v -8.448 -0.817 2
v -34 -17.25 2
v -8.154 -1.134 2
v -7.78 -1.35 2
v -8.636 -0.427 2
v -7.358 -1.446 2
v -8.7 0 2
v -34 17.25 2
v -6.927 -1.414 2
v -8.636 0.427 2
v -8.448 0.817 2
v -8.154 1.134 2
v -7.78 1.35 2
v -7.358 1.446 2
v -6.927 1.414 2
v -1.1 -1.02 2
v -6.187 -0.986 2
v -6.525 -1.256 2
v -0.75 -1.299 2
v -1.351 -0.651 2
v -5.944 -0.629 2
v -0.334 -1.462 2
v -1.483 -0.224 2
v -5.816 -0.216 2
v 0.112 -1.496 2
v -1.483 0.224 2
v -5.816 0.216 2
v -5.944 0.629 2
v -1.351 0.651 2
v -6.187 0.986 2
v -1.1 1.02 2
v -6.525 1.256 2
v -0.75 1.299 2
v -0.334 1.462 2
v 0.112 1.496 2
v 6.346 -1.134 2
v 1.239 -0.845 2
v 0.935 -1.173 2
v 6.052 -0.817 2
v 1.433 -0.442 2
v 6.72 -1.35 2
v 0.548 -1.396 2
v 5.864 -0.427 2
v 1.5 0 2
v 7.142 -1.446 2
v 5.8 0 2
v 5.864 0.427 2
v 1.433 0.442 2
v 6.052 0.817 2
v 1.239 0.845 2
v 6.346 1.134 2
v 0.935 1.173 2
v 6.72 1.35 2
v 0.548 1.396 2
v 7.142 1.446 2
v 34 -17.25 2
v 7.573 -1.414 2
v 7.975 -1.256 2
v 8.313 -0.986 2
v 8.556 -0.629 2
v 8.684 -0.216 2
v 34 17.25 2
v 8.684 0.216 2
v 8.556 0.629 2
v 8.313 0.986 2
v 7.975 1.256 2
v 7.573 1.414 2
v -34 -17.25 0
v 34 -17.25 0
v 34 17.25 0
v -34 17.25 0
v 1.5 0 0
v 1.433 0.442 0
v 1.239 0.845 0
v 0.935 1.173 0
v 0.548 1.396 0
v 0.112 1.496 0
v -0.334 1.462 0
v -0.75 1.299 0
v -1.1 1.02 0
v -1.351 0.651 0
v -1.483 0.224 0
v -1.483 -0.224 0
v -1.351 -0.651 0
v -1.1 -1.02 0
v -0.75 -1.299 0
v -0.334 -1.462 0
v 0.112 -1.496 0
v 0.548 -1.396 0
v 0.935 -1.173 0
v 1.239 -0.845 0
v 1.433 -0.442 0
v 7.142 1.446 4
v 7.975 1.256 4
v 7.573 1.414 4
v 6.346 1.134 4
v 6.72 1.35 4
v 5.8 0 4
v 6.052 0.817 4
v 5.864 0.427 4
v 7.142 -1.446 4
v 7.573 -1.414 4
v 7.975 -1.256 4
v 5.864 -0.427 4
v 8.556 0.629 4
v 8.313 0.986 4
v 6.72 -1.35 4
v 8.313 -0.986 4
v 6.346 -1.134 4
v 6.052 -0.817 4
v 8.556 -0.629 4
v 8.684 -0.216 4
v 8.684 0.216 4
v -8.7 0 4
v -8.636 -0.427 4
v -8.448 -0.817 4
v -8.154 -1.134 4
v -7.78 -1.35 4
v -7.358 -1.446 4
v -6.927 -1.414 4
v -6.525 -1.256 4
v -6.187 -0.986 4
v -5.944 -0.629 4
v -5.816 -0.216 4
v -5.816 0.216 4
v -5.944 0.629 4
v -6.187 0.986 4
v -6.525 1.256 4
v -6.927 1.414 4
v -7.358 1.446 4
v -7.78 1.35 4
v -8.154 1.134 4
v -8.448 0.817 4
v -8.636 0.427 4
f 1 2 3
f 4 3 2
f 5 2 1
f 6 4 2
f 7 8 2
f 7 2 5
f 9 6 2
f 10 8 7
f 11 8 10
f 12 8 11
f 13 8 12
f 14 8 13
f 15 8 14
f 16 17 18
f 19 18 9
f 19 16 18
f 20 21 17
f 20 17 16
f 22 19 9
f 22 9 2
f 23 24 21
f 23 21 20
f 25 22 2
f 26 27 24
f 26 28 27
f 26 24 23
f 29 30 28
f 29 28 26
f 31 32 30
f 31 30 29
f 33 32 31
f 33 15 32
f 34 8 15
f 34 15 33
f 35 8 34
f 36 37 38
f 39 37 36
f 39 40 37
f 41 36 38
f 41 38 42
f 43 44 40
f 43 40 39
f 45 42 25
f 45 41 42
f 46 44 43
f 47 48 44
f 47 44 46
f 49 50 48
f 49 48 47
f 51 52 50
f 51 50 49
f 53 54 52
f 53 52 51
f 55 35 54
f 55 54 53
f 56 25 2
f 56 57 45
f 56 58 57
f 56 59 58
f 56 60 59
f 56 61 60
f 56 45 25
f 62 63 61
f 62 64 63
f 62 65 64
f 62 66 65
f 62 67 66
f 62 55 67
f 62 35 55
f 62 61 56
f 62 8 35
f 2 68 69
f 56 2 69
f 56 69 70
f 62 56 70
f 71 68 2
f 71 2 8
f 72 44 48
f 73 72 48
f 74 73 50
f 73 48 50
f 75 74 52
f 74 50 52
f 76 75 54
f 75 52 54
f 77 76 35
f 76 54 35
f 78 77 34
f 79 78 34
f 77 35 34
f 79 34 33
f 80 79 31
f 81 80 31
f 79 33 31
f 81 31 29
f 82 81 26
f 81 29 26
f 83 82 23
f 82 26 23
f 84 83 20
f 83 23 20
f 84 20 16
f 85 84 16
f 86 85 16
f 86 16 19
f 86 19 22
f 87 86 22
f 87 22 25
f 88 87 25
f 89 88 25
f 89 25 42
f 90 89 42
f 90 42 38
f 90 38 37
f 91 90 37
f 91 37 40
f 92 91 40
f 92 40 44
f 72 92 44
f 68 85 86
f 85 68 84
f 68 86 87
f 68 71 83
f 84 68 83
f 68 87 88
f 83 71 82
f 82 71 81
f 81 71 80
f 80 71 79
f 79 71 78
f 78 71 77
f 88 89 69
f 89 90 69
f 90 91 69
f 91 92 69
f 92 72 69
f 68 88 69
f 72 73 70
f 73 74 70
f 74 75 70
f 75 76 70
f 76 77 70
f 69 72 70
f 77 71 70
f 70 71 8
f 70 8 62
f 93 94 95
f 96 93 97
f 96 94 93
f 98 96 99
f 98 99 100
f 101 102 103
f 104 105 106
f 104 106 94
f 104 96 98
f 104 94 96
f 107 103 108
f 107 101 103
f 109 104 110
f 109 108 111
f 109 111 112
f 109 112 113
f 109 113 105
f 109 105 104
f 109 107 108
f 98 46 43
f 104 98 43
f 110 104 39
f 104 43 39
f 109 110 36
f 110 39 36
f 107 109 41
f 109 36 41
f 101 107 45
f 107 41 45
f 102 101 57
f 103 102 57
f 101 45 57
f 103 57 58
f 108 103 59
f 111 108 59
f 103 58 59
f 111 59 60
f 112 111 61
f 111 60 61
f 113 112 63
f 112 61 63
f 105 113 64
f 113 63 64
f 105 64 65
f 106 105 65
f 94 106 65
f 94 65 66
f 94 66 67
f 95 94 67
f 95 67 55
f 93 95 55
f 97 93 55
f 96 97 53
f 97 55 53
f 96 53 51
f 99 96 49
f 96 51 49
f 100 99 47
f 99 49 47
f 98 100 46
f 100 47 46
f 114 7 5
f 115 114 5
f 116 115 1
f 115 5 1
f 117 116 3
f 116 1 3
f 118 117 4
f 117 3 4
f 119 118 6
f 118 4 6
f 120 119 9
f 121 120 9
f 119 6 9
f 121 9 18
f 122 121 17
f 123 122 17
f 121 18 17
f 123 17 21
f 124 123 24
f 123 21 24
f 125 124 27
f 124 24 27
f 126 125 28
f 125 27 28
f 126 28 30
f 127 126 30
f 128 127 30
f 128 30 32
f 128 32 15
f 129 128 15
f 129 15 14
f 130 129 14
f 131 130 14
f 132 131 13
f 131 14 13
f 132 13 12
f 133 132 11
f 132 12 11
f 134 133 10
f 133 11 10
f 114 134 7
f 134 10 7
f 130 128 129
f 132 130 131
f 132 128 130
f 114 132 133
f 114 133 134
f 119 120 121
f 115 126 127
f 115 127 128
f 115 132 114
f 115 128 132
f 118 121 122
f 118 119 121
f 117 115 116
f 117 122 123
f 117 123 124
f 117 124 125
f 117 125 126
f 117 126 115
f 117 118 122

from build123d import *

# Parameters (mm, degrees)
SKETCH1_W           = 68
SKETCH1_H           = 34.5
BOSS_EXTRUDE1_DEPTH = 2
SKETCH2_R           = 1.45
BOSS_EXTRUDE2_DEPTH = 2
SKETCH3_R           = 1.5
CUT_EXTRUDE1_DEPTH  = 39.17803688


with BuildPart() as part:
    # Sketch1 → Boss-Extrude1 (new body)
    with BuildSketch(Plane.XY):
        Rectangle(SKETCH1_W, SKETCH1_H)
    extrude(amount=BOSS_EXTRUDE1_DEPTH)

    # Sketch2 → Boss-Extrude2 (add)
    with BuildSketch(Plane.XY.offset(2)):
        with Locations(Location((-7.25, 0, 0), (0, 0, 180))):
            Circle(SKETCH2_R)
        with Locations(Location((7.25, 0, 0), (0, 0, 180))):
            Circle(SKETCH2_R)
    extrude(amount=BOSS_EXTRUDE2_DEPTH)

    # Sketch3 → Cut-Extrude1 (cut, through all)
    with BuildSketch(Plane.XY.offset(2)):
        Circle(SKETCH3_R)
    extrude(amount=-CUT_EXTRUDE1_DEPTH, mode=Mode.SUBTRACT)


solid = part.part
